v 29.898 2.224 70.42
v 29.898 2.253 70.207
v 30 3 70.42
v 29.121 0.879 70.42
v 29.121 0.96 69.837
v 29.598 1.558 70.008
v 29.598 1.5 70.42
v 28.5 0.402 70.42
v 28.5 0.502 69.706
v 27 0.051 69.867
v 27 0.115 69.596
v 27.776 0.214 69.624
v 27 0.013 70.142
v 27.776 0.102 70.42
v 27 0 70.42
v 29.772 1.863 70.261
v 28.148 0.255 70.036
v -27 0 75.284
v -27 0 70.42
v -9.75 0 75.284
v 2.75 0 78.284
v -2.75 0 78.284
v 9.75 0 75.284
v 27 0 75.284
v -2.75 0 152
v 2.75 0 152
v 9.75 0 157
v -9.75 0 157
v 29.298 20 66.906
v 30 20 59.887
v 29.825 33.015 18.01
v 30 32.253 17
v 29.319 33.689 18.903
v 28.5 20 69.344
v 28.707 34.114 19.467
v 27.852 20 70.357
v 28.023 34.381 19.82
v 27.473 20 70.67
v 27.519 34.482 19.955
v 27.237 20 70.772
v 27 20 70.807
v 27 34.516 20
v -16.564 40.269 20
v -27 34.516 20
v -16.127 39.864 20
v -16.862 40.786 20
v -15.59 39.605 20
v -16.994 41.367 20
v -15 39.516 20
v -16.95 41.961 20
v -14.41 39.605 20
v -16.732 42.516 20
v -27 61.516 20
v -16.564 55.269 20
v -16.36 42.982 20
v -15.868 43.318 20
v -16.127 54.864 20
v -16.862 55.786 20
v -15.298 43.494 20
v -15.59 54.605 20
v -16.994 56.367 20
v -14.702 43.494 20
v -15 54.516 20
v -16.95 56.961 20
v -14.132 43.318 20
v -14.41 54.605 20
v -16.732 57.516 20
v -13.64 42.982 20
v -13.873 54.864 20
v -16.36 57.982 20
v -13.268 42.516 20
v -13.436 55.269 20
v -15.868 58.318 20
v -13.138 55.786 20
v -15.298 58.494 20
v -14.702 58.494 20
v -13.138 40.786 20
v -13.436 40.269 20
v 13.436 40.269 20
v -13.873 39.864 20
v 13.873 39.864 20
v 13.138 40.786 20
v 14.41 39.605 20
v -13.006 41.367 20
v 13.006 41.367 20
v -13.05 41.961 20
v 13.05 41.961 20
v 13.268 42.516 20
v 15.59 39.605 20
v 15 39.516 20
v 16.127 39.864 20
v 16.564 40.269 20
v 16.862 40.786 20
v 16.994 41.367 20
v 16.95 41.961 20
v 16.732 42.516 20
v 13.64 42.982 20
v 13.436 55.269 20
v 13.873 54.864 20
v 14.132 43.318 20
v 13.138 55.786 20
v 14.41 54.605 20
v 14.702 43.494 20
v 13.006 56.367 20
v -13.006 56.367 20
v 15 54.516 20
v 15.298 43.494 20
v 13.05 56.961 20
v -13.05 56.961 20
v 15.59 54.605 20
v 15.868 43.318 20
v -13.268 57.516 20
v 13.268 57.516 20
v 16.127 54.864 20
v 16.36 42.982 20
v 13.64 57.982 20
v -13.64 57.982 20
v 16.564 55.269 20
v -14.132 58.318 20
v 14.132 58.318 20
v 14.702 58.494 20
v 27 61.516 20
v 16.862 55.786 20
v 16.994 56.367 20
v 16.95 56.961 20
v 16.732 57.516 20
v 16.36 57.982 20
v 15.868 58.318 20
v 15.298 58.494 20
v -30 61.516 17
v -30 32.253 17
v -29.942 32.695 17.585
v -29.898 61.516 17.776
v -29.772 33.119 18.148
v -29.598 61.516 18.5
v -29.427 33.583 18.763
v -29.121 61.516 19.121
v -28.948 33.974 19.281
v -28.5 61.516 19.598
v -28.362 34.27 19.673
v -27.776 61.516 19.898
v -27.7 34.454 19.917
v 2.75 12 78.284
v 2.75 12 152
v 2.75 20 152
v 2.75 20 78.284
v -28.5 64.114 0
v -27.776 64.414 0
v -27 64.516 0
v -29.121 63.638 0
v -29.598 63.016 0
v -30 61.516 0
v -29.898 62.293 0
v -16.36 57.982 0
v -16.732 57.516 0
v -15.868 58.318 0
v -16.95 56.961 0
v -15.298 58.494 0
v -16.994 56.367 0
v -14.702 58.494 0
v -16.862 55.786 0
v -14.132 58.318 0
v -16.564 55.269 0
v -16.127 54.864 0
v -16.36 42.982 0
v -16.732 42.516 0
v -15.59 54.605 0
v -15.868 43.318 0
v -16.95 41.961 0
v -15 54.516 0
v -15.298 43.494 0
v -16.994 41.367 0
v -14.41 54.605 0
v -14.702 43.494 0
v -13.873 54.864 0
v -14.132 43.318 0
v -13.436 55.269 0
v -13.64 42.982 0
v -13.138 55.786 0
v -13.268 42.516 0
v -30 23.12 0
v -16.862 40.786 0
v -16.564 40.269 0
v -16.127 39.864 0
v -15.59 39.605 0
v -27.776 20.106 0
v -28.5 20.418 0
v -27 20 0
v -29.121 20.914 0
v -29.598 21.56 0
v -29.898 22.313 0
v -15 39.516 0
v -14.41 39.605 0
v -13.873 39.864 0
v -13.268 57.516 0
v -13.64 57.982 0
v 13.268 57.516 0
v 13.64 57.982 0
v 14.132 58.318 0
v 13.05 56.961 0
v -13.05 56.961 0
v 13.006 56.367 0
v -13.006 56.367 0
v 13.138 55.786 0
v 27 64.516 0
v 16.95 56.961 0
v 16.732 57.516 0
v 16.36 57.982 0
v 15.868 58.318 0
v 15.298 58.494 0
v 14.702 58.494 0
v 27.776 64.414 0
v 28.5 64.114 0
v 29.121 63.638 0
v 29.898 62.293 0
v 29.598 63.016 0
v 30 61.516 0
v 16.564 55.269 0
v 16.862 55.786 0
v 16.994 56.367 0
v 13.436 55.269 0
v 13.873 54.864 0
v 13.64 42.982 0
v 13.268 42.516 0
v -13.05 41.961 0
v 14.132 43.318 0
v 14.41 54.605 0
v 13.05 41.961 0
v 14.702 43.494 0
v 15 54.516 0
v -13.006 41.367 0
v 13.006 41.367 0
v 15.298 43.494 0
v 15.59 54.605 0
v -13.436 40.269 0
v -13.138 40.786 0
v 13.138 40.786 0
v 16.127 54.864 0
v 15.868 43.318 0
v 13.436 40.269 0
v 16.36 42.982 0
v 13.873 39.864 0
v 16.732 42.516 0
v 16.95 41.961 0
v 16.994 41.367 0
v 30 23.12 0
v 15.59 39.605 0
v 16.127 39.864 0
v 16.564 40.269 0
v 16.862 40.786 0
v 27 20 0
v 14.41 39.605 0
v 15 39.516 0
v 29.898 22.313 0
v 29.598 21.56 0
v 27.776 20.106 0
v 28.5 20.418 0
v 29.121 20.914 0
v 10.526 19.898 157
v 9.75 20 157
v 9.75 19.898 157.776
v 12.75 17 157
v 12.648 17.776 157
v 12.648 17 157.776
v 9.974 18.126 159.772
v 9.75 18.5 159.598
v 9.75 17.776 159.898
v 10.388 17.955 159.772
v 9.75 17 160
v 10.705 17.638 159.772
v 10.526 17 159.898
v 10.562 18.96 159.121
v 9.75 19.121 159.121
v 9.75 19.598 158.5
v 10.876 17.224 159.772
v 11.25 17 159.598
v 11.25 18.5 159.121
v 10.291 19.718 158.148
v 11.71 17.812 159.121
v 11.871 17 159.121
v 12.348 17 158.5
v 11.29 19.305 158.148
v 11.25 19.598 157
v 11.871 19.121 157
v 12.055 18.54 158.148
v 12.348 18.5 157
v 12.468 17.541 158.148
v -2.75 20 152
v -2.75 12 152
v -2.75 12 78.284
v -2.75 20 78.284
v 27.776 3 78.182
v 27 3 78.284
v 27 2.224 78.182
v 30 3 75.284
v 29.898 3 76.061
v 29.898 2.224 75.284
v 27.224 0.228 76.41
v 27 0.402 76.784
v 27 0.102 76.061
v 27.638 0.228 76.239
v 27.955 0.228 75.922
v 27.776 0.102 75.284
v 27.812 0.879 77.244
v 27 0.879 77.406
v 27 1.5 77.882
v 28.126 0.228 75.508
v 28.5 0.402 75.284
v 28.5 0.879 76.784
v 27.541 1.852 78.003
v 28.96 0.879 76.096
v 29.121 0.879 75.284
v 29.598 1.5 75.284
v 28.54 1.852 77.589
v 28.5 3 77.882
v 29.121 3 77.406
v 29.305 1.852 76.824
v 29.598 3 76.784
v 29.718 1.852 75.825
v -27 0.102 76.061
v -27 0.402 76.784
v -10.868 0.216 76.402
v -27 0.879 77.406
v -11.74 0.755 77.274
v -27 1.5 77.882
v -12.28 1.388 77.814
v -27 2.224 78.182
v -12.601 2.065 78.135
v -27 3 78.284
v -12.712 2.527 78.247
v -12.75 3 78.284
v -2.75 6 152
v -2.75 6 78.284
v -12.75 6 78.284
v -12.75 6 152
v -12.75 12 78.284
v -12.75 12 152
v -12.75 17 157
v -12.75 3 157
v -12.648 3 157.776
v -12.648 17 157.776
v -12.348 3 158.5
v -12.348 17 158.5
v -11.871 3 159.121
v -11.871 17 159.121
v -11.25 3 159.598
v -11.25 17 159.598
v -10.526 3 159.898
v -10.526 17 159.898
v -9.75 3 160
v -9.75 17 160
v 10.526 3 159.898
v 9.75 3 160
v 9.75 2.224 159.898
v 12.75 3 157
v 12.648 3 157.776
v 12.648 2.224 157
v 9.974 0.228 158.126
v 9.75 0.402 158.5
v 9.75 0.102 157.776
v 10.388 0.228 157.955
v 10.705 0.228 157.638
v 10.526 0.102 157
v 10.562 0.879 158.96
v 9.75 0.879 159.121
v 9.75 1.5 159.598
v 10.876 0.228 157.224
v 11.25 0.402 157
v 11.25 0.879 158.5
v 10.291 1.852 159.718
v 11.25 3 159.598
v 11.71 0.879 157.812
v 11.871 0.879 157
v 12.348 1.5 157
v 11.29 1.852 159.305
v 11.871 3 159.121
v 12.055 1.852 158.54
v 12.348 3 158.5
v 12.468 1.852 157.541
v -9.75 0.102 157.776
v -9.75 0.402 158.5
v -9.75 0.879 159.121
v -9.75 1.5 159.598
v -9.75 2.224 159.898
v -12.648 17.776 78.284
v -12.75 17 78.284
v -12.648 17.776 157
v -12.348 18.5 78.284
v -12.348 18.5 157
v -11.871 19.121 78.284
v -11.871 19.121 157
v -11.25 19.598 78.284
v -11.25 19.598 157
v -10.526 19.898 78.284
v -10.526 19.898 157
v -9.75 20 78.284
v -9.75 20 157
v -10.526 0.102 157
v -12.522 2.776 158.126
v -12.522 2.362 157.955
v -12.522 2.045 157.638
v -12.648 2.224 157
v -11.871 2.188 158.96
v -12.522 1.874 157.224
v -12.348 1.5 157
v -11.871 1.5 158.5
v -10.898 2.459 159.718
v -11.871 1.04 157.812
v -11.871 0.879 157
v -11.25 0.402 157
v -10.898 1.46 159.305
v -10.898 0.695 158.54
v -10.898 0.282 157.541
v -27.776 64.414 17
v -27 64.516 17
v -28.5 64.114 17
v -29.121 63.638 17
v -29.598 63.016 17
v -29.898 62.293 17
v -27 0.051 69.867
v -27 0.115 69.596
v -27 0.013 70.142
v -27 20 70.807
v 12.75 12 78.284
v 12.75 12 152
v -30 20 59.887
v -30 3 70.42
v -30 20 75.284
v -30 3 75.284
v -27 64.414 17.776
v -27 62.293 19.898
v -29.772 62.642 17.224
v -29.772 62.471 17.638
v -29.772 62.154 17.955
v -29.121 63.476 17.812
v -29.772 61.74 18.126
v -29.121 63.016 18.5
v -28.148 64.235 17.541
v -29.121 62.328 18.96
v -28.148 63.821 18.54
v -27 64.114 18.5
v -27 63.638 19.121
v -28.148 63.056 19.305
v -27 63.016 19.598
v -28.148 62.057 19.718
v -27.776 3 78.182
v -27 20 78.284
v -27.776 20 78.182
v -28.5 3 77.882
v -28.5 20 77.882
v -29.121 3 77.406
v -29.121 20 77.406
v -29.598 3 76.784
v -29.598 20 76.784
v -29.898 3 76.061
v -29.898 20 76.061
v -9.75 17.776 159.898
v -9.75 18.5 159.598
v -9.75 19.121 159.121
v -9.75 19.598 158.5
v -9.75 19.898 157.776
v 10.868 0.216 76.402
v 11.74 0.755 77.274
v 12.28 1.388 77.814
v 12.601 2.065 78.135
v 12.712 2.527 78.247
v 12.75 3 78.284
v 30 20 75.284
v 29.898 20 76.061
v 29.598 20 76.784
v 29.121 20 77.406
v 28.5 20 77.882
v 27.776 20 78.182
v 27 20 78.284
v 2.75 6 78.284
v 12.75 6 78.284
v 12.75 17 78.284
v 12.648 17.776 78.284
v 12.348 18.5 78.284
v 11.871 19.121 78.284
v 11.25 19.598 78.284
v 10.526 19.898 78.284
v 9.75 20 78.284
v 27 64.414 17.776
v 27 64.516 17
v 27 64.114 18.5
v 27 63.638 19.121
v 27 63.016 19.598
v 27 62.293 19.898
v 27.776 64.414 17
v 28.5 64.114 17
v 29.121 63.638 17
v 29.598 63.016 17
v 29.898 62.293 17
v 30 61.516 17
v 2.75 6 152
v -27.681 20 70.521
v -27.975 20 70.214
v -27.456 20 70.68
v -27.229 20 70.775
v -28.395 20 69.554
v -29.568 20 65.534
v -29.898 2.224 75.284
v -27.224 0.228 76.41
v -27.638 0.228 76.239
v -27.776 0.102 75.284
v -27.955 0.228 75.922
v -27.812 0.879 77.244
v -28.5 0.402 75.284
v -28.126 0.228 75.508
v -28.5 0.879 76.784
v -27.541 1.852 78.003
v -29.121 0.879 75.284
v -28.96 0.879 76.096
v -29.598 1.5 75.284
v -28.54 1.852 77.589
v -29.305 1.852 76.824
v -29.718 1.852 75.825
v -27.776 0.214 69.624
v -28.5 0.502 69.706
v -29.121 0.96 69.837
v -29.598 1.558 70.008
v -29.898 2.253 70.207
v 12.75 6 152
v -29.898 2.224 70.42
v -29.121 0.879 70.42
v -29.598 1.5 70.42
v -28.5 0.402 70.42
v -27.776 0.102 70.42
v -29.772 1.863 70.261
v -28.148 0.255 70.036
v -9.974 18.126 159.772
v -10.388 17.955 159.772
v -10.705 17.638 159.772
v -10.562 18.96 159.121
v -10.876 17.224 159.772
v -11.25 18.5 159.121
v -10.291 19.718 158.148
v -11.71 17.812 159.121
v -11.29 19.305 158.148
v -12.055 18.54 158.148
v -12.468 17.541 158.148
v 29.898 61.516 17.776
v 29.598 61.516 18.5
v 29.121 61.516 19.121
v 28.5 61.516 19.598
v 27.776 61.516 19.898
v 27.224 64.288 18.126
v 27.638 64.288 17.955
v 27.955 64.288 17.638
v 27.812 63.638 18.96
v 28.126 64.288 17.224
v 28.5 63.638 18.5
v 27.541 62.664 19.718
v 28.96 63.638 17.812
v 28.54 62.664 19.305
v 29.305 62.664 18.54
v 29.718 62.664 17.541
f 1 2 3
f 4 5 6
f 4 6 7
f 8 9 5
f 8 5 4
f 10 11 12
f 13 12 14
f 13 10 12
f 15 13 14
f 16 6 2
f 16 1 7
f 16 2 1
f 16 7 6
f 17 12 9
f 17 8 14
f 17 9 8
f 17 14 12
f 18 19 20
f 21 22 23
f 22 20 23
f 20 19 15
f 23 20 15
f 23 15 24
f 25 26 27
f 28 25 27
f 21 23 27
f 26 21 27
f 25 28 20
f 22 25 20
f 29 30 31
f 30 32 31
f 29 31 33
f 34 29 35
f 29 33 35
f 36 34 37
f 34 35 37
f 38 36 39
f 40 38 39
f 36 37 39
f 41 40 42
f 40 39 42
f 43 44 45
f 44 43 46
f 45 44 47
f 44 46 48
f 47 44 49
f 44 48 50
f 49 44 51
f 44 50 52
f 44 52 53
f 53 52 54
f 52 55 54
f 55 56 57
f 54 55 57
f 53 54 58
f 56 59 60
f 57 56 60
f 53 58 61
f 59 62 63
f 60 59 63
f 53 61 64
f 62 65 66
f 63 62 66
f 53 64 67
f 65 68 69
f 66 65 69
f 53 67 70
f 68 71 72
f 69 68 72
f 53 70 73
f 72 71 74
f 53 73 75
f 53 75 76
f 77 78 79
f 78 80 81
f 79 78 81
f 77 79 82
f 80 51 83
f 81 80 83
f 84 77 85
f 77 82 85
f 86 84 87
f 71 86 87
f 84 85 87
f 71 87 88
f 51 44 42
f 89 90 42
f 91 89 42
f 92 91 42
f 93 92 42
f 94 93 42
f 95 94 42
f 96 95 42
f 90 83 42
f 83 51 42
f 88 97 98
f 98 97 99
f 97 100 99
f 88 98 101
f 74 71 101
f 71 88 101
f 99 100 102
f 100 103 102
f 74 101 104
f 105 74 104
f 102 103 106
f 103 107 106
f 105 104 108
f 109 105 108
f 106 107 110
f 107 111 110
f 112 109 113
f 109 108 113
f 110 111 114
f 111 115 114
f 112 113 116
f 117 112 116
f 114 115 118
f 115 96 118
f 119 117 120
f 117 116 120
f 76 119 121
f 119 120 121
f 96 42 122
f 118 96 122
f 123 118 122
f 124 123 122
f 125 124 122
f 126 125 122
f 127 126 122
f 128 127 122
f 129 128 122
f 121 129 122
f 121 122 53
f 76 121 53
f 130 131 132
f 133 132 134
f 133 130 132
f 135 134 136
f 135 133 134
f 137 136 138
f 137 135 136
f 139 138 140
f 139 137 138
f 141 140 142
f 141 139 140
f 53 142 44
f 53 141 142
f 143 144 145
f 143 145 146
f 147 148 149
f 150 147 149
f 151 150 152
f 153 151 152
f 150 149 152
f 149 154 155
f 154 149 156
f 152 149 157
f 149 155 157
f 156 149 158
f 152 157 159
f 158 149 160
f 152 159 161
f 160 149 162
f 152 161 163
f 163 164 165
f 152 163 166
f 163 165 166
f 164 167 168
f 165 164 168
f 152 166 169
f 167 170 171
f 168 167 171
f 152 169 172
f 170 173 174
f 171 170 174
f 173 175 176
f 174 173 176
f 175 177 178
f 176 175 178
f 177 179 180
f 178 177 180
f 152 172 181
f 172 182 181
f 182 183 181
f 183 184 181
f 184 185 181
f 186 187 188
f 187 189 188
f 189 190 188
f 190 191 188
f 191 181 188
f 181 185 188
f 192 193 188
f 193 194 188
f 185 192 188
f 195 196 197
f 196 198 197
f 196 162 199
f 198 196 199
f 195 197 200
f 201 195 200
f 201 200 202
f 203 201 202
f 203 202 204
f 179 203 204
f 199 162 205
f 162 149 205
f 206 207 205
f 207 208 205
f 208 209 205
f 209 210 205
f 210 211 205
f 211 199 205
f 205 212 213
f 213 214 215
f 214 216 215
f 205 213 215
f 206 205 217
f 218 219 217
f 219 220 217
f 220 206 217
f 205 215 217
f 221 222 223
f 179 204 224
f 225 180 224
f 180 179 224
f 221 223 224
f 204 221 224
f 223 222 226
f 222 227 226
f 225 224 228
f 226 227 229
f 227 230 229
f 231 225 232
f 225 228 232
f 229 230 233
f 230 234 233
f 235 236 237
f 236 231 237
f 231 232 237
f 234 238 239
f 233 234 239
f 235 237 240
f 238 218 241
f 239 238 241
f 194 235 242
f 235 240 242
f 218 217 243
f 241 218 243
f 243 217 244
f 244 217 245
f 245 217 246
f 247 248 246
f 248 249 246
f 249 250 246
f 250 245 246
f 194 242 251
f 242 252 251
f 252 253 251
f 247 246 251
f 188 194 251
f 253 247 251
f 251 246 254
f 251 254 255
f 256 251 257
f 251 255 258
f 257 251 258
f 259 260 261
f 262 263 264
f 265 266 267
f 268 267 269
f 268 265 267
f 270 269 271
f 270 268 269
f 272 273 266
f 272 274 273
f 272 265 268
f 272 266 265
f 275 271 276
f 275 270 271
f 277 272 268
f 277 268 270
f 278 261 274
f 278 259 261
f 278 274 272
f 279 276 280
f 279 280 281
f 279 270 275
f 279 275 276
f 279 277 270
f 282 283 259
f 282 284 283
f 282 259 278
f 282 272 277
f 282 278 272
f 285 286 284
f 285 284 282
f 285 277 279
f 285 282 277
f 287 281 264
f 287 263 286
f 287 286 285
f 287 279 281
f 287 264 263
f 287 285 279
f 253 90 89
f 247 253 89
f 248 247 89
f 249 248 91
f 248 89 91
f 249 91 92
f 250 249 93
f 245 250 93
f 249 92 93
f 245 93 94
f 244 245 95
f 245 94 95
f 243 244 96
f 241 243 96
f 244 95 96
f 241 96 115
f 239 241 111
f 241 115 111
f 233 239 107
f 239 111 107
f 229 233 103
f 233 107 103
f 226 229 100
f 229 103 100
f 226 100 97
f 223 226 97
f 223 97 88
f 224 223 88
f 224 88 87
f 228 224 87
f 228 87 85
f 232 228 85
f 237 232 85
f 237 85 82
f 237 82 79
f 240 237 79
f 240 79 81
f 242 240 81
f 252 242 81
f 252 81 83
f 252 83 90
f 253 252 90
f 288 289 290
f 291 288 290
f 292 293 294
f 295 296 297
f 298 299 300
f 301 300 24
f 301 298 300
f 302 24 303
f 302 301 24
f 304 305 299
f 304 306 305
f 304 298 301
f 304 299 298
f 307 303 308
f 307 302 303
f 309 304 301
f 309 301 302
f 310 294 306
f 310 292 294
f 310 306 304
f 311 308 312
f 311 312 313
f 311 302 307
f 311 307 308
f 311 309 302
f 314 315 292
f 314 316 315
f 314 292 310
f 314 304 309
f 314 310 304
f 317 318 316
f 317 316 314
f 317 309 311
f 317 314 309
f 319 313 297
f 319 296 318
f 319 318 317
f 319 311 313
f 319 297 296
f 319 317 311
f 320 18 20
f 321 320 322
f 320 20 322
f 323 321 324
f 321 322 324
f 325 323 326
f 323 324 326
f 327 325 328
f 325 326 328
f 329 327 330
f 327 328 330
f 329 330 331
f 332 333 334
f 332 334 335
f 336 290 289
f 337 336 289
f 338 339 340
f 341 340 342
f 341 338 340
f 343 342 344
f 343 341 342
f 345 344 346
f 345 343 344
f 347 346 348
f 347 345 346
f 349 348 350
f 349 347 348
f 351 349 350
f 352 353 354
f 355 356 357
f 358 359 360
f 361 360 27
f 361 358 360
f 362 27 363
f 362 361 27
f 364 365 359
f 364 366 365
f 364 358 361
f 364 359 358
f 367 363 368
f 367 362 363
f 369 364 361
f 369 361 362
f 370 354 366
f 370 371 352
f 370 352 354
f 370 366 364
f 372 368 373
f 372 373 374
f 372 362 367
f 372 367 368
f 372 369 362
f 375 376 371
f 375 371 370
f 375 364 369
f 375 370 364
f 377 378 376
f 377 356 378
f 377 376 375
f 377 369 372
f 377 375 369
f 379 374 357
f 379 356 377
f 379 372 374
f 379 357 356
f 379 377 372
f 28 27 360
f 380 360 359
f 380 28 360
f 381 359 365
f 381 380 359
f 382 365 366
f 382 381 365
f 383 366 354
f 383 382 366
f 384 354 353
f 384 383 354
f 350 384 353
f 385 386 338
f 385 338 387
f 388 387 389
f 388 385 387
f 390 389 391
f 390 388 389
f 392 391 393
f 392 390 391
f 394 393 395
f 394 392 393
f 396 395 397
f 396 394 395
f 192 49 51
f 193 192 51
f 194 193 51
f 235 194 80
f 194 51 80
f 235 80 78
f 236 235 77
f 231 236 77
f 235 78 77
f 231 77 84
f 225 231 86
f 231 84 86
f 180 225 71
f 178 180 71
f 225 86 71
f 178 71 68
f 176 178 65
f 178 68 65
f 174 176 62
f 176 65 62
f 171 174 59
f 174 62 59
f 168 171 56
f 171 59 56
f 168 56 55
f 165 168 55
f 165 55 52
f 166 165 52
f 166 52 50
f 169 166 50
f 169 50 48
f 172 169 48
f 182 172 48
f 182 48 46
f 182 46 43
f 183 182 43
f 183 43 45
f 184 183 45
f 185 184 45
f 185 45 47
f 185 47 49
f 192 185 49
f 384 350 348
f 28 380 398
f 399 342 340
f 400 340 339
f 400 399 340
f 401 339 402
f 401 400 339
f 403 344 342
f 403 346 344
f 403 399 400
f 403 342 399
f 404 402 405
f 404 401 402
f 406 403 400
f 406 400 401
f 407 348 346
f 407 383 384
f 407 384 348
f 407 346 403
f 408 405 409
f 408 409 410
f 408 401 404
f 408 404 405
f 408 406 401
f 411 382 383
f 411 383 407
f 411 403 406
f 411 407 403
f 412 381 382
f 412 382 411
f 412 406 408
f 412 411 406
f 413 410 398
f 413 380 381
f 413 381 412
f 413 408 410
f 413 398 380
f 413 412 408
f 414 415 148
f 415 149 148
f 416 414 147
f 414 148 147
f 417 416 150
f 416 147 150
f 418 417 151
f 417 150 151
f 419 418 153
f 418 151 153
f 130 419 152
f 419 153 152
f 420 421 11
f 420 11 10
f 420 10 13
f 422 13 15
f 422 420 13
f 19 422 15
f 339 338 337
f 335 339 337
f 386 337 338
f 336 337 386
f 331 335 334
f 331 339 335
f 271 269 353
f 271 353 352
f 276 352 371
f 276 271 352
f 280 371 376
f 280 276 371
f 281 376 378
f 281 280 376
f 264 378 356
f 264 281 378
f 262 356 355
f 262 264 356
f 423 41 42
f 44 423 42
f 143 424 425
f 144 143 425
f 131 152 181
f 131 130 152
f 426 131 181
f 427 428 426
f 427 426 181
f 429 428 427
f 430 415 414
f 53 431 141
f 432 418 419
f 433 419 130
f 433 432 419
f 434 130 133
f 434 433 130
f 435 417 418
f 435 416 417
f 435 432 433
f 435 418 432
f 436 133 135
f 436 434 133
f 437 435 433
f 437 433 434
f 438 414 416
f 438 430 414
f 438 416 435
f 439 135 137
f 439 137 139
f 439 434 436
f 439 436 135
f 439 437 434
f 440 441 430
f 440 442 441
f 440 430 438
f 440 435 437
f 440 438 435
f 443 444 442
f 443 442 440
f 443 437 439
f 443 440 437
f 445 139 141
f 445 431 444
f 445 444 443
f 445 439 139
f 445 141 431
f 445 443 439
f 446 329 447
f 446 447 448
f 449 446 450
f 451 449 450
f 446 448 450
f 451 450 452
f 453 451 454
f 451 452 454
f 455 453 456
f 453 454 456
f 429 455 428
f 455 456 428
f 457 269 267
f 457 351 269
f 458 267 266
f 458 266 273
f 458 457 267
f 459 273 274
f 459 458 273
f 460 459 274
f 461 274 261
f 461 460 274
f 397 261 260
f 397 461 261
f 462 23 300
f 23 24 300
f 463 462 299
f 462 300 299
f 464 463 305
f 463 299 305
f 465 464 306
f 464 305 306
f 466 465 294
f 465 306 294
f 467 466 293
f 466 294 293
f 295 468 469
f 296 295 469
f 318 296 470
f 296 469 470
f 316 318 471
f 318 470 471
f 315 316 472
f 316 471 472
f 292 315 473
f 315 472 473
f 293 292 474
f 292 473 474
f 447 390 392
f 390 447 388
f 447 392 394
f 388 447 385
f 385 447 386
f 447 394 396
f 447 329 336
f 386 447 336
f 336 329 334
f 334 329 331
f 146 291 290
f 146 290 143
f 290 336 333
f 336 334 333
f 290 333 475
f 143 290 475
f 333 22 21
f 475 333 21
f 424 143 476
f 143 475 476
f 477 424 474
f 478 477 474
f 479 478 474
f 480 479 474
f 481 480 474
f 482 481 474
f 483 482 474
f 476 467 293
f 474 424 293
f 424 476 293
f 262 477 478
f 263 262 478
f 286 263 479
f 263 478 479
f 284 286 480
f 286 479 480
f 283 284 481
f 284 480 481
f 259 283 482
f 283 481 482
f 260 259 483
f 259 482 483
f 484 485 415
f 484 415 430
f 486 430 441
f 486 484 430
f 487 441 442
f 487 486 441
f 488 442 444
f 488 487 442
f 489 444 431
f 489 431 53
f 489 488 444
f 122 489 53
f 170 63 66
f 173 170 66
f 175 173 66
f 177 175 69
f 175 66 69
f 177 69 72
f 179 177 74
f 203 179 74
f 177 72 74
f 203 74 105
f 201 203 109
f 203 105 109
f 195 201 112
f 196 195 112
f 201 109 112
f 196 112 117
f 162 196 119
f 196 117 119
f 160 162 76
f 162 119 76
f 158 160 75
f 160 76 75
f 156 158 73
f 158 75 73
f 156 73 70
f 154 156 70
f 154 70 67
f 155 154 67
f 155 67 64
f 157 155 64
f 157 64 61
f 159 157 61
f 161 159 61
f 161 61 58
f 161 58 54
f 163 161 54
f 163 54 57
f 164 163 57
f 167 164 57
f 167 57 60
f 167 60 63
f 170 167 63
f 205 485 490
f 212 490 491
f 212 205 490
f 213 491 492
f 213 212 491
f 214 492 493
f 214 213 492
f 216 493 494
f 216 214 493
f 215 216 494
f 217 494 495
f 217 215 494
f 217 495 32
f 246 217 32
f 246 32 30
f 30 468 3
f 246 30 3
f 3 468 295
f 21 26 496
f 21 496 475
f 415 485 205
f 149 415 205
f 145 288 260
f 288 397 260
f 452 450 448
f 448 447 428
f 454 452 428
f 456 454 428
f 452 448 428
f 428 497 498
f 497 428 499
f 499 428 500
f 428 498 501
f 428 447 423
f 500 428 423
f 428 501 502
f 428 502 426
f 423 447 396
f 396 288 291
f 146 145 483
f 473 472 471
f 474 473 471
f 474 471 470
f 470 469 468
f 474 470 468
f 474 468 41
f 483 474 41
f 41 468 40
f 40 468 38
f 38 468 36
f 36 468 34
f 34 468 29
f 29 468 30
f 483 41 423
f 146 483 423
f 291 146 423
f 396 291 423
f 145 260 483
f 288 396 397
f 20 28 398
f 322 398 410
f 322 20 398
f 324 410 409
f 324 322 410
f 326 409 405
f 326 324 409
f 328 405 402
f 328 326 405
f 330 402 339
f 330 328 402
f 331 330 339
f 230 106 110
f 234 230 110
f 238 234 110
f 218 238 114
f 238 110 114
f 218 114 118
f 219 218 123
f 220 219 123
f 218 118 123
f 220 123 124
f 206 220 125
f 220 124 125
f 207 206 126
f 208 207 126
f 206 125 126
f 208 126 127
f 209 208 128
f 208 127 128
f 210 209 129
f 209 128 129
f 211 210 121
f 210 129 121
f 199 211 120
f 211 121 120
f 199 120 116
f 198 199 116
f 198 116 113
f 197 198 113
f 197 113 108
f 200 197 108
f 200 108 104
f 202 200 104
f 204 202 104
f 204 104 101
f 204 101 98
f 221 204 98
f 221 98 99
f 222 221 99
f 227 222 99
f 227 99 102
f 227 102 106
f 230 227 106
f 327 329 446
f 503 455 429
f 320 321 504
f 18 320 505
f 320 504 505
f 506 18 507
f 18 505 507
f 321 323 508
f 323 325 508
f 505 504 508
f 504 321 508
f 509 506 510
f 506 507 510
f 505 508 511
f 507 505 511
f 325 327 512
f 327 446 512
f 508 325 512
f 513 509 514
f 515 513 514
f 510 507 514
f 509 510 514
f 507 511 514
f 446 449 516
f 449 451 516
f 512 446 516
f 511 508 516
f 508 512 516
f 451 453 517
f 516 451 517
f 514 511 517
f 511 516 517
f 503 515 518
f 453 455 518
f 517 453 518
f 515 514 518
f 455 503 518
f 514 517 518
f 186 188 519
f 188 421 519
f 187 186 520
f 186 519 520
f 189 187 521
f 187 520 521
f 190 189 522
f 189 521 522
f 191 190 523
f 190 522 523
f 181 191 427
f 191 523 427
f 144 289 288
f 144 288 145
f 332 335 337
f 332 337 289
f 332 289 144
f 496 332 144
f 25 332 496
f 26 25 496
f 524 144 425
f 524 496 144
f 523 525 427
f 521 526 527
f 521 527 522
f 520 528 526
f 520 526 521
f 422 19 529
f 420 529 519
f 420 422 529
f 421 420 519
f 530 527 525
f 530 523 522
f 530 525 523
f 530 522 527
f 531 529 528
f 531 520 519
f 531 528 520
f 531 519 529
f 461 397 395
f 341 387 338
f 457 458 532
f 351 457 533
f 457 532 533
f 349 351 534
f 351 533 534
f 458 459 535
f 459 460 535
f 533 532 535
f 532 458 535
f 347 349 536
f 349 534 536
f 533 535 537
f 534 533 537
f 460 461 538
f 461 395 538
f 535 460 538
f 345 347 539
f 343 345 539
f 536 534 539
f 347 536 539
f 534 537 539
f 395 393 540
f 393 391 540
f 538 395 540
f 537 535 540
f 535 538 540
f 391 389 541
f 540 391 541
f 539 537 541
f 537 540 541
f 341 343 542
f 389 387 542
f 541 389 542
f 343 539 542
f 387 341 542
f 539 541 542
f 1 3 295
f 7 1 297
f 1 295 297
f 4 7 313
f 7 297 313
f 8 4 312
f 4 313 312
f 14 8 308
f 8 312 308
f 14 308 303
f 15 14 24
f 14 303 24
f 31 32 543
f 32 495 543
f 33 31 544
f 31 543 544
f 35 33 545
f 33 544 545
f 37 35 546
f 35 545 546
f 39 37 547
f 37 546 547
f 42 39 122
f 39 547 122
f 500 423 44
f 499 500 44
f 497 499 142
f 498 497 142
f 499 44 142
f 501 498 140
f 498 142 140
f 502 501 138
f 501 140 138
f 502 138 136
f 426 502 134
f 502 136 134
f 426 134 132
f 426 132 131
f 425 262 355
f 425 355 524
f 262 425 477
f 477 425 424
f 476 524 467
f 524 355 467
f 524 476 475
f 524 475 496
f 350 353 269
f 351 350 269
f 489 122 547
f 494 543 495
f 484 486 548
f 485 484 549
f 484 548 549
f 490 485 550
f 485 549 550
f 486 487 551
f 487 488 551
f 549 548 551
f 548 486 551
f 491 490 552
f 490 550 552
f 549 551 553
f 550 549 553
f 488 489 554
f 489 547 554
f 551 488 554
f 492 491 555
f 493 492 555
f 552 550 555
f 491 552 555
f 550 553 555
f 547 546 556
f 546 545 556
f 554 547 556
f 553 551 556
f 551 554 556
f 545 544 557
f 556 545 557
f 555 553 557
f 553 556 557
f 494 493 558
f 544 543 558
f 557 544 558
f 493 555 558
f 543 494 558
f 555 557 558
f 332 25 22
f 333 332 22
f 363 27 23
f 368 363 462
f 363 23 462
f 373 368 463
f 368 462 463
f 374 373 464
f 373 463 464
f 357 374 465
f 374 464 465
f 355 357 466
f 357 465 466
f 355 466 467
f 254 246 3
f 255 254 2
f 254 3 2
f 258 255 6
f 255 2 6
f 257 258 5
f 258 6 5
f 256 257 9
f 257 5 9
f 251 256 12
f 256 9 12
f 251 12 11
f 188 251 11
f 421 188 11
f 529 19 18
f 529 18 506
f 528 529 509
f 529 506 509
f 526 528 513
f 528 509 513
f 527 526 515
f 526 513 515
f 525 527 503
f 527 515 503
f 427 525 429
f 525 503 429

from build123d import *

# Parameters (mm, degrees)
PAD_DEPTH       = 30
SKETCH001_R     = 2
POCKET_DEPTH    = 50
SKETCH002_W     = 81.7157287525
SKETCH002_H     = 17.25
SKETCH002_W_2   = 73.7157287525
SKETCH002_H_2   = 5.5
POCKET001_DEPTH = 50
SKETCH003_W     = 6
SKETCH003_H     = 73.7157287525
POCKET002_DEPTH = 50
FILLET_R        = 3


with BuildPart() as part:
    # Sketch → Pad (new body, symmetric)
    with BuildSketch(Plane.YZ):
        Polygon((64.5161954169, 20), (64.5161954169, 0), (20, 0), (0, 70), (0, 160), (20, 160), (20, 70.8066839593), (34.5161954169, 20), align=None)
    extrude(amount=PAD_DEPTH, both=True)

    # Sketch001 (on Face3 of Pad) → Pocket (cut)
    with BuildSketch(Plane(origin=(0, 0, 20), x_dir=(0, -1, 0), z_dir=(0, 0, 1))):
        with Locations((-56.5161954169, -15)):
            Circle(SKETCH001_R)
        with Locations((-56.5161954169, 15)):
            Circle(SKETCH001_R)
        with Locations((-41.5161954169, 15)):
            Circle(SKETCH001_R)
        with Locations((-41.5161954169, -15)):
            Circle(SKETCH001_R)
    extrude(amount=-POCKET_DEPTH, mode=Mode.SUBTRACT)

    # Sketch002 (on Face6 of Pocket) → Pocket001 (cut)
    with BuildSketch(Plane(origin=(0, 0, 0), x_dir=(0, 0, -1), z_dir=(0, -1, 0))):
        with Locations((-119.1421356237, 21.375)):
            Rectangle(SKETCH002_W, SKETCH002_H)
        with Locations((-119.1421356237, -21.375)):
            Rectangle(SKETCH002_W, SKETCH002_H)
        with Locations((-115.1421356237, 0)):
            Rectangle(SKETCH002_W_2, SKETCH002_H_2)
    extrude(amount=-POCKET001_DEPTH, mode=Mode.SUBTRACT)

    # Sketch003 (on Face8 of Pocket001) → Pocket002 (cut)
    with BuildSketch(Plane.YZ.offset(12.75)):
        with Locations((9, 115.1421356237)):
            Rectangle(SKETCH003_W, SKETCH003_H)
    extrude(amount=-POCKET002_DEPTH, mode=Mode.SUBTRACT)

    # Fillet
    fillet_edges = [part.edges().sort_by_distance(p)[0] for p in [
        (30, 27.258098, 45.403342),
        (-30, 27.258098, 45.403342),
        (30, 49.516195, 20),
        (0, 64.516195, 20),
        (-30, 64.516195, 10),
        (-30, 49.516195, 20),
        (30, 64.516195, 10),
        (12.75, 20, 119.142136),
        (-12.75, 20, 119.142136),
        (0, 20, 160),
        (12.75, 10, 160),
        (0, 0, 160),
        (-12.75, 10, 160),
        (12.75, 0, 119.142136),
        (30, 10, 78.284271),
        (21.375, 0, 78.284271),
        (-12.75, 0, 119.142136),
        (-30, 10, 78.284271),
        (-21.375, 0, 78.284271),
        (-30, 0, 74.142136),
        (-30, 10, 35),
        (0, 0, 70),
        (30, 10, 35),
        (30, 0, 74.142136),
    ]]
    fillet(fillet_edges, radius=FILLET_R)


solid = part.part
